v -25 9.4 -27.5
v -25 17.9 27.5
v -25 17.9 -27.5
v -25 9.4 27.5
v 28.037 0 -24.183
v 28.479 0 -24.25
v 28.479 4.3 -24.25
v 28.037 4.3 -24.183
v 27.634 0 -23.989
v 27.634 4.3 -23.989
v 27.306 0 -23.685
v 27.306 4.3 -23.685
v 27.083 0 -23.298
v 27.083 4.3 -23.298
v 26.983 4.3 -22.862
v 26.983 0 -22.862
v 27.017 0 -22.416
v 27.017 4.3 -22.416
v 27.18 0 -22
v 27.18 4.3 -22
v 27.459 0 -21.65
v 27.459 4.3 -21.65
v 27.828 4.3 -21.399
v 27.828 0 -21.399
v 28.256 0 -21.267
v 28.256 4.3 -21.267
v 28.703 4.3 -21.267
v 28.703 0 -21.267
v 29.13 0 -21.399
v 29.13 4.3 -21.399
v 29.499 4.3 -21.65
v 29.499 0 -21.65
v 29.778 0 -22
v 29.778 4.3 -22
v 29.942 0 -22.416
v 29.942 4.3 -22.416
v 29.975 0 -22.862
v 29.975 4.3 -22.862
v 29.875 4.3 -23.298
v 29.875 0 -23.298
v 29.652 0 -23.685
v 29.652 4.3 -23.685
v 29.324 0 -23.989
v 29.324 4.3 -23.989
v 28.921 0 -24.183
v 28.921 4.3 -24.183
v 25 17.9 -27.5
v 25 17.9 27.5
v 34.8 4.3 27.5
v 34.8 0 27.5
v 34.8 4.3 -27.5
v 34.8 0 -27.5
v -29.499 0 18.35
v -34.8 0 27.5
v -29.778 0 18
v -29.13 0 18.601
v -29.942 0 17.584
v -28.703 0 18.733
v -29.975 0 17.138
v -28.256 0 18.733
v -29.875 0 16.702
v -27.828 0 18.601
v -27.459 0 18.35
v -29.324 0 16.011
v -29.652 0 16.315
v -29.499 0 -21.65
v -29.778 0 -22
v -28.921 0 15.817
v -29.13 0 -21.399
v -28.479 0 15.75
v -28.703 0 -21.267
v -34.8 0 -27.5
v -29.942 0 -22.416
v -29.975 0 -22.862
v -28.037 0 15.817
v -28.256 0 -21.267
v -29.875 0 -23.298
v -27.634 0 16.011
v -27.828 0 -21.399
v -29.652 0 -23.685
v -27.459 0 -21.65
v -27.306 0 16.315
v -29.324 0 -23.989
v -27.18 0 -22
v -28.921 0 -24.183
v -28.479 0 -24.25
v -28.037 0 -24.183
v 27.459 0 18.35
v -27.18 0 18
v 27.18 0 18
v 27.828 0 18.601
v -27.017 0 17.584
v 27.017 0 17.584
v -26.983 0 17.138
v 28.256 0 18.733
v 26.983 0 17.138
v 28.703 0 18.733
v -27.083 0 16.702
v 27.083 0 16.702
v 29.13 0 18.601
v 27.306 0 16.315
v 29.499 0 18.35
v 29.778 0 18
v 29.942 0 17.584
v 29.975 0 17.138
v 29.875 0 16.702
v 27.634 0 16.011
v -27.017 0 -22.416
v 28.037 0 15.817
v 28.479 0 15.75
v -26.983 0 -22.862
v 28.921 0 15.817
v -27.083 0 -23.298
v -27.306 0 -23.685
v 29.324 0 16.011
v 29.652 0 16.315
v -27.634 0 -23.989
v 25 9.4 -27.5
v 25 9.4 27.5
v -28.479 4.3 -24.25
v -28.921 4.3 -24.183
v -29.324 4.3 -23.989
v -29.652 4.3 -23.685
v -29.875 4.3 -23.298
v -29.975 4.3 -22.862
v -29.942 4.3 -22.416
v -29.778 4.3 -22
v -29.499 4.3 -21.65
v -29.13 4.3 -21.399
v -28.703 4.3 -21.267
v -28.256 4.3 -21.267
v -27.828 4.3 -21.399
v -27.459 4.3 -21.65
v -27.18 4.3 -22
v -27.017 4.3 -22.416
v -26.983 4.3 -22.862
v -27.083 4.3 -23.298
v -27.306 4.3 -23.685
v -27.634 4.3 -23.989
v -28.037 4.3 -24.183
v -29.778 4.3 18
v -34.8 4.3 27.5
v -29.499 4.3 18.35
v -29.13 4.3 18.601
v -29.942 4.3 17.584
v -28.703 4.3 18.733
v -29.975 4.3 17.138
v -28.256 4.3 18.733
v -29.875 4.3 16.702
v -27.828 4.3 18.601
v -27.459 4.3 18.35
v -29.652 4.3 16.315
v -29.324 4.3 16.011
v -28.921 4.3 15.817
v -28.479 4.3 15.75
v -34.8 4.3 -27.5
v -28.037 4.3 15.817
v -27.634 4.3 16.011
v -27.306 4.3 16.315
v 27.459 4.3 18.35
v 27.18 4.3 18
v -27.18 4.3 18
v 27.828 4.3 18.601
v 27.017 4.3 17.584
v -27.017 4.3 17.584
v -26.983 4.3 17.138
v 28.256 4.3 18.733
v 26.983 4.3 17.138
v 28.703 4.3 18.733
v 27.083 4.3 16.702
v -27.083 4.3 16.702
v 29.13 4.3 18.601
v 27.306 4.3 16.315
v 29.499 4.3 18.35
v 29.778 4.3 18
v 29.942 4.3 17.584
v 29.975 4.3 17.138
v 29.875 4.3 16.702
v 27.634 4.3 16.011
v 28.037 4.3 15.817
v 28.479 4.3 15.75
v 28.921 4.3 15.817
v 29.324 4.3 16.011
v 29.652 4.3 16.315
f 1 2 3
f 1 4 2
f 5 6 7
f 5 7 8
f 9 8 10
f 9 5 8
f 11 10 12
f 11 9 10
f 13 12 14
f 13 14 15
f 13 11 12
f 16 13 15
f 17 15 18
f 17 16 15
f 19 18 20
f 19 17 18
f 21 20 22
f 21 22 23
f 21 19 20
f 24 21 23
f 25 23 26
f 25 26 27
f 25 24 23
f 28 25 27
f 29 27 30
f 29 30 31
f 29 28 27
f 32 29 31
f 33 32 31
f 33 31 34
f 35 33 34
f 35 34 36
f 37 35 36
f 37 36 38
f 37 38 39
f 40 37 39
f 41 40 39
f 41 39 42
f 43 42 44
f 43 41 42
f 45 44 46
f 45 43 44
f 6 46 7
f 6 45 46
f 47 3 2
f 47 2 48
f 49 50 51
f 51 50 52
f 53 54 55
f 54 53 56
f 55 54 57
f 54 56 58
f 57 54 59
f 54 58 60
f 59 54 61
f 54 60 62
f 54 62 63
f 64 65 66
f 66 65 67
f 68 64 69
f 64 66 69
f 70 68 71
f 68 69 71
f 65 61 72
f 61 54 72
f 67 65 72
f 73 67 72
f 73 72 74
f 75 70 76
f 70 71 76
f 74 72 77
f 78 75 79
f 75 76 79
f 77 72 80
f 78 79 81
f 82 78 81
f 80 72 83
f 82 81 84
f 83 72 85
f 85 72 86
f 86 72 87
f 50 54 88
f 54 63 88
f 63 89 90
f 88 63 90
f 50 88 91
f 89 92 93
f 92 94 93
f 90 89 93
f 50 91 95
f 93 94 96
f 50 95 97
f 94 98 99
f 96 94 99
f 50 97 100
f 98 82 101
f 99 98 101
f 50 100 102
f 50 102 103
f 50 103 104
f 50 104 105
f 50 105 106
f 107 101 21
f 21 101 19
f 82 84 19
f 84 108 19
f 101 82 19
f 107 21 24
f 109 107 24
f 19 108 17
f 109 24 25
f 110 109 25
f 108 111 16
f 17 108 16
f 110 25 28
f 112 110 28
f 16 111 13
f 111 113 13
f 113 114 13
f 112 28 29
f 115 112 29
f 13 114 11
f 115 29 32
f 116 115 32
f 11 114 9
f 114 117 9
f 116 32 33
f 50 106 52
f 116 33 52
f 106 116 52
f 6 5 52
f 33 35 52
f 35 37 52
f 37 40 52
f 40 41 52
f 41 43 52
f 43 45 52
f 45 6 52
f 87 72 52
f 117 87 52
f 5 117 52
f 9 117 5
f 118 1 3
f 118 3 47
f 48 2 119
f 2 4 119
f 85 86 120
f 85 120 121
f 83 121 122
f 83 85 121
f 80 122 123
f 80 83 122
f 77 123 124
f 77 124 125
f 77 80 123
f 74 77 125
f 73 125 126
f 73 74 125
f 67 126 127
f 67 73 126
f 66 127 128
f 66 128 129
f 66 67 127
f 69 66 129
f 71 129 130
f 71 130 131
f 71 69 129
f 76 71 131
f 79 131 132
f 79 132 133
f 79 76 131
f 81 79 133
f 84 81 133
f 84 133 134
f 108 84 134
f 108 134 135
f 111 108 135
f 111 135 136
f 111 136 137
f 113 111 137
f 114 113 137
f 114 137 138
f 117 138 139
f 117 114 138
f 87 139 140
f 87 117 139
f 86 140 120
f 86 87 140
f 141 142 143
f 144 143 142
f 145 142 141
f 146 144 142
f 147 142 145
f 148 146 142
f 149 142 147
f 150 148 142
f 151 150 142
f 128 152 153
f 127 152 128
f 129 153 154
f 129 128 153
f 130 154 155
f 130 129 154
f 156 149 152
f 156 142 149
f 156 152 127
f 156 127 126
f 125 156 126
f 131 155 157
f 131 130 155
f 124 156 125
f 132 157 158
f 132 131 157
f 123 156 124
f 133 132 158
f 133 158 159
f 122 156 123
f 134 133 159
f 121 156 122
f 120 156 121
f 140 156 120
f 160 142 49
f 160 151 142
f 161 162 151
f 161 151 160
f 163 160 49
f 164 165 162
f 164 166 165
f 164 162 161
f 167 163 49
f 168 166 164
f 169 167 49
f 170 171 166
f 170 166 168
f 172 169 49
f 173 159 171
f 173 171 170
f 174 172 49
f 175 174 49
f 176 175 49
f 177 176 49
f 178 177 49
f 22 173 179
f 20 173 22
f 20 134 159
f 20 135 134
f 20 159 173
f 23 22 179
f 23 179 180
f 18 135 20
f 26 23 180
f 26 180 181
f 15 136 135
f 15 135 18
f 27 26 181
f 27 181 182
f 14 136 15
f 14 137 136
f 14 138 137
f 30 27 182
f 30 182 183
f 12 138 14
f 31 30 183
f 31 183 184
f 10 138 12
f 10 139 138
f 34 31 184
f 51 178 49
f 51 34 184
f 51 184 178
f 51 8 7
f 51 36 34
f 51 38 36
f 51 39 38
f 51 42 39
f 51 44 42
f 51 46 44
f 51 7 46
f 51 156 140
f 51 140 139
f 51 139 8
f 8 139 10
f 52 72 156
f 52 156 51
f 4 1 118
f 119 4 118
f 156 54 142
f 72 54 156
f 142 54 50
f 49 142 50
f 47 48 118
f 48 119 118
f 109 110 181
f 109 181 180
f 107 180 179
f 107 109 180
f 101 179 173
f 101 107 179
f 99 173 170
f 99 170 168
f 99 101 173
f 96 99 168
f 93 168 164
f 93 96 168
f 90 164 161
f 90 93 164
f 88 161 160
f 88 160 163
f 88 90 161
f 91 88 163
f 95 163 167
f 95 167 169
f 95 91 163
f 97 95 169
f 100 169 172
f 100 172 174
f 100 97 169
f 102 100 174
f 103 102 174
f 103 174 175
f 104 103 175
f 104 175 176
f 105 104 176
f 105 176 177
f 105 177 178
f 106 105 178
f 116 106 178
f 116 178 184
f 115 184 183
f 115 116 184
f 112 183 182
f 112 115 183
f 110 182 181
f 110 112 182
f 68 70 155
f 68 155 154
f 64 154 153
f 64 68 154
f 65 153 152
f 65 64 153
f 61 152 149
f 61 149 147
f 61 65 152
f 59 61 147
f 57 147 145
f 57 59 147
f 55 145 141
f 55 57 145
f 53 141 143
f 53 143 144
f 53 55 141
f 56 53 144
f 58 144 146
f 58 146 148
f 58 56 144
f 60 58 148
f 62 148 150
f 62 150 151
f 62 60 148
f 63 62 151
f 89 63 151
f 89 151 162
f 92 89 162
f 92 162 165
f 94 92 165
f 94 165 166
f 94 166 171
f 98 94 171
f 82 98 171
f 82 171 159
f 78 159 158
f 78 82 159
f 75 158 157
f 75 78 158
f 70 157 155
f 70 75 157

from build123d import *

# Parameters (mm, degrees)
SKETCH1_W           = 69.6
SKETCH1_H           = 55
SKETCH1_R           = 1.5
BOSS_EXTRUDE1_DEPTH = 4.3
SKETCH3_W           = 50
SKETCH3_H           = 55
BOSS_EXTRUDE2_DEPTH = 1.5
SKETCH5_W           = 50
SKETCH5_H           = 55
BOSS_EXTRUDE3_DEPTH = 7


with BuildPart() as part:
    # Sketch1 → Boss-Extrude1 (new body)
    with BuildSketch(Plane(origin=(0, 0, 0), x_dir=(1, 0, 0), z_dir=(0, 1, 0))):
        Rectangle(SKETCH1_W, SKETCH1_H)
        with Locations(Location((28.47912844, 22.75, 0), (0, 0, 90))):
            Circle(SKETCH1_R, mode=Mode.SUBTRACT)
        with Locations(Location((28.47912844, -17.25, 0), (0, 0, 90))):
            Circle(SKETCH1_R, mode=Mode.SUBTRACT)
        with Locations(Location((-28.47912844, -17.25, 0), (0, 0, 90))):
            Circle(SKETCH1_R, mode=Mode.SUBTRACT)
        with Locations(Location((-28.47912844, 22.75, 0), (0, 0, 90))):
            Circle(SKETCH1_R, mode=Mode.SUBTRACT)
    extrude(amount=BOSS_EXTRUDE1_DEPTH)


with BuildPart() as body_2:
    # Sketch3 → Boss-Extrude2 (new body)
    with BuildSketch(Plane(origin=(0, 9.4, 0), x_dir=(1, 0, 0), z_dir=(0, 1, 0))):
        Rectangle(SKETCH3_W, SKETCH3_H)
    extrude(amount=BOSS_EXTRUDE2_DEPTH)

    # Sketch5 → Boss-Extrude3 (add)
    with BuildSketch(Plane(origin=(0, 10.9, 0), x_dir=(1, 0, 0), z_dir=(0, 1, 0))):
        Rectangle(SKETCH5_W, SKETCH5_H)
    extrude(amount=BOSS_EXTRUDE3_DEPTH)


solid = Compound([part.part, body_2.part])
